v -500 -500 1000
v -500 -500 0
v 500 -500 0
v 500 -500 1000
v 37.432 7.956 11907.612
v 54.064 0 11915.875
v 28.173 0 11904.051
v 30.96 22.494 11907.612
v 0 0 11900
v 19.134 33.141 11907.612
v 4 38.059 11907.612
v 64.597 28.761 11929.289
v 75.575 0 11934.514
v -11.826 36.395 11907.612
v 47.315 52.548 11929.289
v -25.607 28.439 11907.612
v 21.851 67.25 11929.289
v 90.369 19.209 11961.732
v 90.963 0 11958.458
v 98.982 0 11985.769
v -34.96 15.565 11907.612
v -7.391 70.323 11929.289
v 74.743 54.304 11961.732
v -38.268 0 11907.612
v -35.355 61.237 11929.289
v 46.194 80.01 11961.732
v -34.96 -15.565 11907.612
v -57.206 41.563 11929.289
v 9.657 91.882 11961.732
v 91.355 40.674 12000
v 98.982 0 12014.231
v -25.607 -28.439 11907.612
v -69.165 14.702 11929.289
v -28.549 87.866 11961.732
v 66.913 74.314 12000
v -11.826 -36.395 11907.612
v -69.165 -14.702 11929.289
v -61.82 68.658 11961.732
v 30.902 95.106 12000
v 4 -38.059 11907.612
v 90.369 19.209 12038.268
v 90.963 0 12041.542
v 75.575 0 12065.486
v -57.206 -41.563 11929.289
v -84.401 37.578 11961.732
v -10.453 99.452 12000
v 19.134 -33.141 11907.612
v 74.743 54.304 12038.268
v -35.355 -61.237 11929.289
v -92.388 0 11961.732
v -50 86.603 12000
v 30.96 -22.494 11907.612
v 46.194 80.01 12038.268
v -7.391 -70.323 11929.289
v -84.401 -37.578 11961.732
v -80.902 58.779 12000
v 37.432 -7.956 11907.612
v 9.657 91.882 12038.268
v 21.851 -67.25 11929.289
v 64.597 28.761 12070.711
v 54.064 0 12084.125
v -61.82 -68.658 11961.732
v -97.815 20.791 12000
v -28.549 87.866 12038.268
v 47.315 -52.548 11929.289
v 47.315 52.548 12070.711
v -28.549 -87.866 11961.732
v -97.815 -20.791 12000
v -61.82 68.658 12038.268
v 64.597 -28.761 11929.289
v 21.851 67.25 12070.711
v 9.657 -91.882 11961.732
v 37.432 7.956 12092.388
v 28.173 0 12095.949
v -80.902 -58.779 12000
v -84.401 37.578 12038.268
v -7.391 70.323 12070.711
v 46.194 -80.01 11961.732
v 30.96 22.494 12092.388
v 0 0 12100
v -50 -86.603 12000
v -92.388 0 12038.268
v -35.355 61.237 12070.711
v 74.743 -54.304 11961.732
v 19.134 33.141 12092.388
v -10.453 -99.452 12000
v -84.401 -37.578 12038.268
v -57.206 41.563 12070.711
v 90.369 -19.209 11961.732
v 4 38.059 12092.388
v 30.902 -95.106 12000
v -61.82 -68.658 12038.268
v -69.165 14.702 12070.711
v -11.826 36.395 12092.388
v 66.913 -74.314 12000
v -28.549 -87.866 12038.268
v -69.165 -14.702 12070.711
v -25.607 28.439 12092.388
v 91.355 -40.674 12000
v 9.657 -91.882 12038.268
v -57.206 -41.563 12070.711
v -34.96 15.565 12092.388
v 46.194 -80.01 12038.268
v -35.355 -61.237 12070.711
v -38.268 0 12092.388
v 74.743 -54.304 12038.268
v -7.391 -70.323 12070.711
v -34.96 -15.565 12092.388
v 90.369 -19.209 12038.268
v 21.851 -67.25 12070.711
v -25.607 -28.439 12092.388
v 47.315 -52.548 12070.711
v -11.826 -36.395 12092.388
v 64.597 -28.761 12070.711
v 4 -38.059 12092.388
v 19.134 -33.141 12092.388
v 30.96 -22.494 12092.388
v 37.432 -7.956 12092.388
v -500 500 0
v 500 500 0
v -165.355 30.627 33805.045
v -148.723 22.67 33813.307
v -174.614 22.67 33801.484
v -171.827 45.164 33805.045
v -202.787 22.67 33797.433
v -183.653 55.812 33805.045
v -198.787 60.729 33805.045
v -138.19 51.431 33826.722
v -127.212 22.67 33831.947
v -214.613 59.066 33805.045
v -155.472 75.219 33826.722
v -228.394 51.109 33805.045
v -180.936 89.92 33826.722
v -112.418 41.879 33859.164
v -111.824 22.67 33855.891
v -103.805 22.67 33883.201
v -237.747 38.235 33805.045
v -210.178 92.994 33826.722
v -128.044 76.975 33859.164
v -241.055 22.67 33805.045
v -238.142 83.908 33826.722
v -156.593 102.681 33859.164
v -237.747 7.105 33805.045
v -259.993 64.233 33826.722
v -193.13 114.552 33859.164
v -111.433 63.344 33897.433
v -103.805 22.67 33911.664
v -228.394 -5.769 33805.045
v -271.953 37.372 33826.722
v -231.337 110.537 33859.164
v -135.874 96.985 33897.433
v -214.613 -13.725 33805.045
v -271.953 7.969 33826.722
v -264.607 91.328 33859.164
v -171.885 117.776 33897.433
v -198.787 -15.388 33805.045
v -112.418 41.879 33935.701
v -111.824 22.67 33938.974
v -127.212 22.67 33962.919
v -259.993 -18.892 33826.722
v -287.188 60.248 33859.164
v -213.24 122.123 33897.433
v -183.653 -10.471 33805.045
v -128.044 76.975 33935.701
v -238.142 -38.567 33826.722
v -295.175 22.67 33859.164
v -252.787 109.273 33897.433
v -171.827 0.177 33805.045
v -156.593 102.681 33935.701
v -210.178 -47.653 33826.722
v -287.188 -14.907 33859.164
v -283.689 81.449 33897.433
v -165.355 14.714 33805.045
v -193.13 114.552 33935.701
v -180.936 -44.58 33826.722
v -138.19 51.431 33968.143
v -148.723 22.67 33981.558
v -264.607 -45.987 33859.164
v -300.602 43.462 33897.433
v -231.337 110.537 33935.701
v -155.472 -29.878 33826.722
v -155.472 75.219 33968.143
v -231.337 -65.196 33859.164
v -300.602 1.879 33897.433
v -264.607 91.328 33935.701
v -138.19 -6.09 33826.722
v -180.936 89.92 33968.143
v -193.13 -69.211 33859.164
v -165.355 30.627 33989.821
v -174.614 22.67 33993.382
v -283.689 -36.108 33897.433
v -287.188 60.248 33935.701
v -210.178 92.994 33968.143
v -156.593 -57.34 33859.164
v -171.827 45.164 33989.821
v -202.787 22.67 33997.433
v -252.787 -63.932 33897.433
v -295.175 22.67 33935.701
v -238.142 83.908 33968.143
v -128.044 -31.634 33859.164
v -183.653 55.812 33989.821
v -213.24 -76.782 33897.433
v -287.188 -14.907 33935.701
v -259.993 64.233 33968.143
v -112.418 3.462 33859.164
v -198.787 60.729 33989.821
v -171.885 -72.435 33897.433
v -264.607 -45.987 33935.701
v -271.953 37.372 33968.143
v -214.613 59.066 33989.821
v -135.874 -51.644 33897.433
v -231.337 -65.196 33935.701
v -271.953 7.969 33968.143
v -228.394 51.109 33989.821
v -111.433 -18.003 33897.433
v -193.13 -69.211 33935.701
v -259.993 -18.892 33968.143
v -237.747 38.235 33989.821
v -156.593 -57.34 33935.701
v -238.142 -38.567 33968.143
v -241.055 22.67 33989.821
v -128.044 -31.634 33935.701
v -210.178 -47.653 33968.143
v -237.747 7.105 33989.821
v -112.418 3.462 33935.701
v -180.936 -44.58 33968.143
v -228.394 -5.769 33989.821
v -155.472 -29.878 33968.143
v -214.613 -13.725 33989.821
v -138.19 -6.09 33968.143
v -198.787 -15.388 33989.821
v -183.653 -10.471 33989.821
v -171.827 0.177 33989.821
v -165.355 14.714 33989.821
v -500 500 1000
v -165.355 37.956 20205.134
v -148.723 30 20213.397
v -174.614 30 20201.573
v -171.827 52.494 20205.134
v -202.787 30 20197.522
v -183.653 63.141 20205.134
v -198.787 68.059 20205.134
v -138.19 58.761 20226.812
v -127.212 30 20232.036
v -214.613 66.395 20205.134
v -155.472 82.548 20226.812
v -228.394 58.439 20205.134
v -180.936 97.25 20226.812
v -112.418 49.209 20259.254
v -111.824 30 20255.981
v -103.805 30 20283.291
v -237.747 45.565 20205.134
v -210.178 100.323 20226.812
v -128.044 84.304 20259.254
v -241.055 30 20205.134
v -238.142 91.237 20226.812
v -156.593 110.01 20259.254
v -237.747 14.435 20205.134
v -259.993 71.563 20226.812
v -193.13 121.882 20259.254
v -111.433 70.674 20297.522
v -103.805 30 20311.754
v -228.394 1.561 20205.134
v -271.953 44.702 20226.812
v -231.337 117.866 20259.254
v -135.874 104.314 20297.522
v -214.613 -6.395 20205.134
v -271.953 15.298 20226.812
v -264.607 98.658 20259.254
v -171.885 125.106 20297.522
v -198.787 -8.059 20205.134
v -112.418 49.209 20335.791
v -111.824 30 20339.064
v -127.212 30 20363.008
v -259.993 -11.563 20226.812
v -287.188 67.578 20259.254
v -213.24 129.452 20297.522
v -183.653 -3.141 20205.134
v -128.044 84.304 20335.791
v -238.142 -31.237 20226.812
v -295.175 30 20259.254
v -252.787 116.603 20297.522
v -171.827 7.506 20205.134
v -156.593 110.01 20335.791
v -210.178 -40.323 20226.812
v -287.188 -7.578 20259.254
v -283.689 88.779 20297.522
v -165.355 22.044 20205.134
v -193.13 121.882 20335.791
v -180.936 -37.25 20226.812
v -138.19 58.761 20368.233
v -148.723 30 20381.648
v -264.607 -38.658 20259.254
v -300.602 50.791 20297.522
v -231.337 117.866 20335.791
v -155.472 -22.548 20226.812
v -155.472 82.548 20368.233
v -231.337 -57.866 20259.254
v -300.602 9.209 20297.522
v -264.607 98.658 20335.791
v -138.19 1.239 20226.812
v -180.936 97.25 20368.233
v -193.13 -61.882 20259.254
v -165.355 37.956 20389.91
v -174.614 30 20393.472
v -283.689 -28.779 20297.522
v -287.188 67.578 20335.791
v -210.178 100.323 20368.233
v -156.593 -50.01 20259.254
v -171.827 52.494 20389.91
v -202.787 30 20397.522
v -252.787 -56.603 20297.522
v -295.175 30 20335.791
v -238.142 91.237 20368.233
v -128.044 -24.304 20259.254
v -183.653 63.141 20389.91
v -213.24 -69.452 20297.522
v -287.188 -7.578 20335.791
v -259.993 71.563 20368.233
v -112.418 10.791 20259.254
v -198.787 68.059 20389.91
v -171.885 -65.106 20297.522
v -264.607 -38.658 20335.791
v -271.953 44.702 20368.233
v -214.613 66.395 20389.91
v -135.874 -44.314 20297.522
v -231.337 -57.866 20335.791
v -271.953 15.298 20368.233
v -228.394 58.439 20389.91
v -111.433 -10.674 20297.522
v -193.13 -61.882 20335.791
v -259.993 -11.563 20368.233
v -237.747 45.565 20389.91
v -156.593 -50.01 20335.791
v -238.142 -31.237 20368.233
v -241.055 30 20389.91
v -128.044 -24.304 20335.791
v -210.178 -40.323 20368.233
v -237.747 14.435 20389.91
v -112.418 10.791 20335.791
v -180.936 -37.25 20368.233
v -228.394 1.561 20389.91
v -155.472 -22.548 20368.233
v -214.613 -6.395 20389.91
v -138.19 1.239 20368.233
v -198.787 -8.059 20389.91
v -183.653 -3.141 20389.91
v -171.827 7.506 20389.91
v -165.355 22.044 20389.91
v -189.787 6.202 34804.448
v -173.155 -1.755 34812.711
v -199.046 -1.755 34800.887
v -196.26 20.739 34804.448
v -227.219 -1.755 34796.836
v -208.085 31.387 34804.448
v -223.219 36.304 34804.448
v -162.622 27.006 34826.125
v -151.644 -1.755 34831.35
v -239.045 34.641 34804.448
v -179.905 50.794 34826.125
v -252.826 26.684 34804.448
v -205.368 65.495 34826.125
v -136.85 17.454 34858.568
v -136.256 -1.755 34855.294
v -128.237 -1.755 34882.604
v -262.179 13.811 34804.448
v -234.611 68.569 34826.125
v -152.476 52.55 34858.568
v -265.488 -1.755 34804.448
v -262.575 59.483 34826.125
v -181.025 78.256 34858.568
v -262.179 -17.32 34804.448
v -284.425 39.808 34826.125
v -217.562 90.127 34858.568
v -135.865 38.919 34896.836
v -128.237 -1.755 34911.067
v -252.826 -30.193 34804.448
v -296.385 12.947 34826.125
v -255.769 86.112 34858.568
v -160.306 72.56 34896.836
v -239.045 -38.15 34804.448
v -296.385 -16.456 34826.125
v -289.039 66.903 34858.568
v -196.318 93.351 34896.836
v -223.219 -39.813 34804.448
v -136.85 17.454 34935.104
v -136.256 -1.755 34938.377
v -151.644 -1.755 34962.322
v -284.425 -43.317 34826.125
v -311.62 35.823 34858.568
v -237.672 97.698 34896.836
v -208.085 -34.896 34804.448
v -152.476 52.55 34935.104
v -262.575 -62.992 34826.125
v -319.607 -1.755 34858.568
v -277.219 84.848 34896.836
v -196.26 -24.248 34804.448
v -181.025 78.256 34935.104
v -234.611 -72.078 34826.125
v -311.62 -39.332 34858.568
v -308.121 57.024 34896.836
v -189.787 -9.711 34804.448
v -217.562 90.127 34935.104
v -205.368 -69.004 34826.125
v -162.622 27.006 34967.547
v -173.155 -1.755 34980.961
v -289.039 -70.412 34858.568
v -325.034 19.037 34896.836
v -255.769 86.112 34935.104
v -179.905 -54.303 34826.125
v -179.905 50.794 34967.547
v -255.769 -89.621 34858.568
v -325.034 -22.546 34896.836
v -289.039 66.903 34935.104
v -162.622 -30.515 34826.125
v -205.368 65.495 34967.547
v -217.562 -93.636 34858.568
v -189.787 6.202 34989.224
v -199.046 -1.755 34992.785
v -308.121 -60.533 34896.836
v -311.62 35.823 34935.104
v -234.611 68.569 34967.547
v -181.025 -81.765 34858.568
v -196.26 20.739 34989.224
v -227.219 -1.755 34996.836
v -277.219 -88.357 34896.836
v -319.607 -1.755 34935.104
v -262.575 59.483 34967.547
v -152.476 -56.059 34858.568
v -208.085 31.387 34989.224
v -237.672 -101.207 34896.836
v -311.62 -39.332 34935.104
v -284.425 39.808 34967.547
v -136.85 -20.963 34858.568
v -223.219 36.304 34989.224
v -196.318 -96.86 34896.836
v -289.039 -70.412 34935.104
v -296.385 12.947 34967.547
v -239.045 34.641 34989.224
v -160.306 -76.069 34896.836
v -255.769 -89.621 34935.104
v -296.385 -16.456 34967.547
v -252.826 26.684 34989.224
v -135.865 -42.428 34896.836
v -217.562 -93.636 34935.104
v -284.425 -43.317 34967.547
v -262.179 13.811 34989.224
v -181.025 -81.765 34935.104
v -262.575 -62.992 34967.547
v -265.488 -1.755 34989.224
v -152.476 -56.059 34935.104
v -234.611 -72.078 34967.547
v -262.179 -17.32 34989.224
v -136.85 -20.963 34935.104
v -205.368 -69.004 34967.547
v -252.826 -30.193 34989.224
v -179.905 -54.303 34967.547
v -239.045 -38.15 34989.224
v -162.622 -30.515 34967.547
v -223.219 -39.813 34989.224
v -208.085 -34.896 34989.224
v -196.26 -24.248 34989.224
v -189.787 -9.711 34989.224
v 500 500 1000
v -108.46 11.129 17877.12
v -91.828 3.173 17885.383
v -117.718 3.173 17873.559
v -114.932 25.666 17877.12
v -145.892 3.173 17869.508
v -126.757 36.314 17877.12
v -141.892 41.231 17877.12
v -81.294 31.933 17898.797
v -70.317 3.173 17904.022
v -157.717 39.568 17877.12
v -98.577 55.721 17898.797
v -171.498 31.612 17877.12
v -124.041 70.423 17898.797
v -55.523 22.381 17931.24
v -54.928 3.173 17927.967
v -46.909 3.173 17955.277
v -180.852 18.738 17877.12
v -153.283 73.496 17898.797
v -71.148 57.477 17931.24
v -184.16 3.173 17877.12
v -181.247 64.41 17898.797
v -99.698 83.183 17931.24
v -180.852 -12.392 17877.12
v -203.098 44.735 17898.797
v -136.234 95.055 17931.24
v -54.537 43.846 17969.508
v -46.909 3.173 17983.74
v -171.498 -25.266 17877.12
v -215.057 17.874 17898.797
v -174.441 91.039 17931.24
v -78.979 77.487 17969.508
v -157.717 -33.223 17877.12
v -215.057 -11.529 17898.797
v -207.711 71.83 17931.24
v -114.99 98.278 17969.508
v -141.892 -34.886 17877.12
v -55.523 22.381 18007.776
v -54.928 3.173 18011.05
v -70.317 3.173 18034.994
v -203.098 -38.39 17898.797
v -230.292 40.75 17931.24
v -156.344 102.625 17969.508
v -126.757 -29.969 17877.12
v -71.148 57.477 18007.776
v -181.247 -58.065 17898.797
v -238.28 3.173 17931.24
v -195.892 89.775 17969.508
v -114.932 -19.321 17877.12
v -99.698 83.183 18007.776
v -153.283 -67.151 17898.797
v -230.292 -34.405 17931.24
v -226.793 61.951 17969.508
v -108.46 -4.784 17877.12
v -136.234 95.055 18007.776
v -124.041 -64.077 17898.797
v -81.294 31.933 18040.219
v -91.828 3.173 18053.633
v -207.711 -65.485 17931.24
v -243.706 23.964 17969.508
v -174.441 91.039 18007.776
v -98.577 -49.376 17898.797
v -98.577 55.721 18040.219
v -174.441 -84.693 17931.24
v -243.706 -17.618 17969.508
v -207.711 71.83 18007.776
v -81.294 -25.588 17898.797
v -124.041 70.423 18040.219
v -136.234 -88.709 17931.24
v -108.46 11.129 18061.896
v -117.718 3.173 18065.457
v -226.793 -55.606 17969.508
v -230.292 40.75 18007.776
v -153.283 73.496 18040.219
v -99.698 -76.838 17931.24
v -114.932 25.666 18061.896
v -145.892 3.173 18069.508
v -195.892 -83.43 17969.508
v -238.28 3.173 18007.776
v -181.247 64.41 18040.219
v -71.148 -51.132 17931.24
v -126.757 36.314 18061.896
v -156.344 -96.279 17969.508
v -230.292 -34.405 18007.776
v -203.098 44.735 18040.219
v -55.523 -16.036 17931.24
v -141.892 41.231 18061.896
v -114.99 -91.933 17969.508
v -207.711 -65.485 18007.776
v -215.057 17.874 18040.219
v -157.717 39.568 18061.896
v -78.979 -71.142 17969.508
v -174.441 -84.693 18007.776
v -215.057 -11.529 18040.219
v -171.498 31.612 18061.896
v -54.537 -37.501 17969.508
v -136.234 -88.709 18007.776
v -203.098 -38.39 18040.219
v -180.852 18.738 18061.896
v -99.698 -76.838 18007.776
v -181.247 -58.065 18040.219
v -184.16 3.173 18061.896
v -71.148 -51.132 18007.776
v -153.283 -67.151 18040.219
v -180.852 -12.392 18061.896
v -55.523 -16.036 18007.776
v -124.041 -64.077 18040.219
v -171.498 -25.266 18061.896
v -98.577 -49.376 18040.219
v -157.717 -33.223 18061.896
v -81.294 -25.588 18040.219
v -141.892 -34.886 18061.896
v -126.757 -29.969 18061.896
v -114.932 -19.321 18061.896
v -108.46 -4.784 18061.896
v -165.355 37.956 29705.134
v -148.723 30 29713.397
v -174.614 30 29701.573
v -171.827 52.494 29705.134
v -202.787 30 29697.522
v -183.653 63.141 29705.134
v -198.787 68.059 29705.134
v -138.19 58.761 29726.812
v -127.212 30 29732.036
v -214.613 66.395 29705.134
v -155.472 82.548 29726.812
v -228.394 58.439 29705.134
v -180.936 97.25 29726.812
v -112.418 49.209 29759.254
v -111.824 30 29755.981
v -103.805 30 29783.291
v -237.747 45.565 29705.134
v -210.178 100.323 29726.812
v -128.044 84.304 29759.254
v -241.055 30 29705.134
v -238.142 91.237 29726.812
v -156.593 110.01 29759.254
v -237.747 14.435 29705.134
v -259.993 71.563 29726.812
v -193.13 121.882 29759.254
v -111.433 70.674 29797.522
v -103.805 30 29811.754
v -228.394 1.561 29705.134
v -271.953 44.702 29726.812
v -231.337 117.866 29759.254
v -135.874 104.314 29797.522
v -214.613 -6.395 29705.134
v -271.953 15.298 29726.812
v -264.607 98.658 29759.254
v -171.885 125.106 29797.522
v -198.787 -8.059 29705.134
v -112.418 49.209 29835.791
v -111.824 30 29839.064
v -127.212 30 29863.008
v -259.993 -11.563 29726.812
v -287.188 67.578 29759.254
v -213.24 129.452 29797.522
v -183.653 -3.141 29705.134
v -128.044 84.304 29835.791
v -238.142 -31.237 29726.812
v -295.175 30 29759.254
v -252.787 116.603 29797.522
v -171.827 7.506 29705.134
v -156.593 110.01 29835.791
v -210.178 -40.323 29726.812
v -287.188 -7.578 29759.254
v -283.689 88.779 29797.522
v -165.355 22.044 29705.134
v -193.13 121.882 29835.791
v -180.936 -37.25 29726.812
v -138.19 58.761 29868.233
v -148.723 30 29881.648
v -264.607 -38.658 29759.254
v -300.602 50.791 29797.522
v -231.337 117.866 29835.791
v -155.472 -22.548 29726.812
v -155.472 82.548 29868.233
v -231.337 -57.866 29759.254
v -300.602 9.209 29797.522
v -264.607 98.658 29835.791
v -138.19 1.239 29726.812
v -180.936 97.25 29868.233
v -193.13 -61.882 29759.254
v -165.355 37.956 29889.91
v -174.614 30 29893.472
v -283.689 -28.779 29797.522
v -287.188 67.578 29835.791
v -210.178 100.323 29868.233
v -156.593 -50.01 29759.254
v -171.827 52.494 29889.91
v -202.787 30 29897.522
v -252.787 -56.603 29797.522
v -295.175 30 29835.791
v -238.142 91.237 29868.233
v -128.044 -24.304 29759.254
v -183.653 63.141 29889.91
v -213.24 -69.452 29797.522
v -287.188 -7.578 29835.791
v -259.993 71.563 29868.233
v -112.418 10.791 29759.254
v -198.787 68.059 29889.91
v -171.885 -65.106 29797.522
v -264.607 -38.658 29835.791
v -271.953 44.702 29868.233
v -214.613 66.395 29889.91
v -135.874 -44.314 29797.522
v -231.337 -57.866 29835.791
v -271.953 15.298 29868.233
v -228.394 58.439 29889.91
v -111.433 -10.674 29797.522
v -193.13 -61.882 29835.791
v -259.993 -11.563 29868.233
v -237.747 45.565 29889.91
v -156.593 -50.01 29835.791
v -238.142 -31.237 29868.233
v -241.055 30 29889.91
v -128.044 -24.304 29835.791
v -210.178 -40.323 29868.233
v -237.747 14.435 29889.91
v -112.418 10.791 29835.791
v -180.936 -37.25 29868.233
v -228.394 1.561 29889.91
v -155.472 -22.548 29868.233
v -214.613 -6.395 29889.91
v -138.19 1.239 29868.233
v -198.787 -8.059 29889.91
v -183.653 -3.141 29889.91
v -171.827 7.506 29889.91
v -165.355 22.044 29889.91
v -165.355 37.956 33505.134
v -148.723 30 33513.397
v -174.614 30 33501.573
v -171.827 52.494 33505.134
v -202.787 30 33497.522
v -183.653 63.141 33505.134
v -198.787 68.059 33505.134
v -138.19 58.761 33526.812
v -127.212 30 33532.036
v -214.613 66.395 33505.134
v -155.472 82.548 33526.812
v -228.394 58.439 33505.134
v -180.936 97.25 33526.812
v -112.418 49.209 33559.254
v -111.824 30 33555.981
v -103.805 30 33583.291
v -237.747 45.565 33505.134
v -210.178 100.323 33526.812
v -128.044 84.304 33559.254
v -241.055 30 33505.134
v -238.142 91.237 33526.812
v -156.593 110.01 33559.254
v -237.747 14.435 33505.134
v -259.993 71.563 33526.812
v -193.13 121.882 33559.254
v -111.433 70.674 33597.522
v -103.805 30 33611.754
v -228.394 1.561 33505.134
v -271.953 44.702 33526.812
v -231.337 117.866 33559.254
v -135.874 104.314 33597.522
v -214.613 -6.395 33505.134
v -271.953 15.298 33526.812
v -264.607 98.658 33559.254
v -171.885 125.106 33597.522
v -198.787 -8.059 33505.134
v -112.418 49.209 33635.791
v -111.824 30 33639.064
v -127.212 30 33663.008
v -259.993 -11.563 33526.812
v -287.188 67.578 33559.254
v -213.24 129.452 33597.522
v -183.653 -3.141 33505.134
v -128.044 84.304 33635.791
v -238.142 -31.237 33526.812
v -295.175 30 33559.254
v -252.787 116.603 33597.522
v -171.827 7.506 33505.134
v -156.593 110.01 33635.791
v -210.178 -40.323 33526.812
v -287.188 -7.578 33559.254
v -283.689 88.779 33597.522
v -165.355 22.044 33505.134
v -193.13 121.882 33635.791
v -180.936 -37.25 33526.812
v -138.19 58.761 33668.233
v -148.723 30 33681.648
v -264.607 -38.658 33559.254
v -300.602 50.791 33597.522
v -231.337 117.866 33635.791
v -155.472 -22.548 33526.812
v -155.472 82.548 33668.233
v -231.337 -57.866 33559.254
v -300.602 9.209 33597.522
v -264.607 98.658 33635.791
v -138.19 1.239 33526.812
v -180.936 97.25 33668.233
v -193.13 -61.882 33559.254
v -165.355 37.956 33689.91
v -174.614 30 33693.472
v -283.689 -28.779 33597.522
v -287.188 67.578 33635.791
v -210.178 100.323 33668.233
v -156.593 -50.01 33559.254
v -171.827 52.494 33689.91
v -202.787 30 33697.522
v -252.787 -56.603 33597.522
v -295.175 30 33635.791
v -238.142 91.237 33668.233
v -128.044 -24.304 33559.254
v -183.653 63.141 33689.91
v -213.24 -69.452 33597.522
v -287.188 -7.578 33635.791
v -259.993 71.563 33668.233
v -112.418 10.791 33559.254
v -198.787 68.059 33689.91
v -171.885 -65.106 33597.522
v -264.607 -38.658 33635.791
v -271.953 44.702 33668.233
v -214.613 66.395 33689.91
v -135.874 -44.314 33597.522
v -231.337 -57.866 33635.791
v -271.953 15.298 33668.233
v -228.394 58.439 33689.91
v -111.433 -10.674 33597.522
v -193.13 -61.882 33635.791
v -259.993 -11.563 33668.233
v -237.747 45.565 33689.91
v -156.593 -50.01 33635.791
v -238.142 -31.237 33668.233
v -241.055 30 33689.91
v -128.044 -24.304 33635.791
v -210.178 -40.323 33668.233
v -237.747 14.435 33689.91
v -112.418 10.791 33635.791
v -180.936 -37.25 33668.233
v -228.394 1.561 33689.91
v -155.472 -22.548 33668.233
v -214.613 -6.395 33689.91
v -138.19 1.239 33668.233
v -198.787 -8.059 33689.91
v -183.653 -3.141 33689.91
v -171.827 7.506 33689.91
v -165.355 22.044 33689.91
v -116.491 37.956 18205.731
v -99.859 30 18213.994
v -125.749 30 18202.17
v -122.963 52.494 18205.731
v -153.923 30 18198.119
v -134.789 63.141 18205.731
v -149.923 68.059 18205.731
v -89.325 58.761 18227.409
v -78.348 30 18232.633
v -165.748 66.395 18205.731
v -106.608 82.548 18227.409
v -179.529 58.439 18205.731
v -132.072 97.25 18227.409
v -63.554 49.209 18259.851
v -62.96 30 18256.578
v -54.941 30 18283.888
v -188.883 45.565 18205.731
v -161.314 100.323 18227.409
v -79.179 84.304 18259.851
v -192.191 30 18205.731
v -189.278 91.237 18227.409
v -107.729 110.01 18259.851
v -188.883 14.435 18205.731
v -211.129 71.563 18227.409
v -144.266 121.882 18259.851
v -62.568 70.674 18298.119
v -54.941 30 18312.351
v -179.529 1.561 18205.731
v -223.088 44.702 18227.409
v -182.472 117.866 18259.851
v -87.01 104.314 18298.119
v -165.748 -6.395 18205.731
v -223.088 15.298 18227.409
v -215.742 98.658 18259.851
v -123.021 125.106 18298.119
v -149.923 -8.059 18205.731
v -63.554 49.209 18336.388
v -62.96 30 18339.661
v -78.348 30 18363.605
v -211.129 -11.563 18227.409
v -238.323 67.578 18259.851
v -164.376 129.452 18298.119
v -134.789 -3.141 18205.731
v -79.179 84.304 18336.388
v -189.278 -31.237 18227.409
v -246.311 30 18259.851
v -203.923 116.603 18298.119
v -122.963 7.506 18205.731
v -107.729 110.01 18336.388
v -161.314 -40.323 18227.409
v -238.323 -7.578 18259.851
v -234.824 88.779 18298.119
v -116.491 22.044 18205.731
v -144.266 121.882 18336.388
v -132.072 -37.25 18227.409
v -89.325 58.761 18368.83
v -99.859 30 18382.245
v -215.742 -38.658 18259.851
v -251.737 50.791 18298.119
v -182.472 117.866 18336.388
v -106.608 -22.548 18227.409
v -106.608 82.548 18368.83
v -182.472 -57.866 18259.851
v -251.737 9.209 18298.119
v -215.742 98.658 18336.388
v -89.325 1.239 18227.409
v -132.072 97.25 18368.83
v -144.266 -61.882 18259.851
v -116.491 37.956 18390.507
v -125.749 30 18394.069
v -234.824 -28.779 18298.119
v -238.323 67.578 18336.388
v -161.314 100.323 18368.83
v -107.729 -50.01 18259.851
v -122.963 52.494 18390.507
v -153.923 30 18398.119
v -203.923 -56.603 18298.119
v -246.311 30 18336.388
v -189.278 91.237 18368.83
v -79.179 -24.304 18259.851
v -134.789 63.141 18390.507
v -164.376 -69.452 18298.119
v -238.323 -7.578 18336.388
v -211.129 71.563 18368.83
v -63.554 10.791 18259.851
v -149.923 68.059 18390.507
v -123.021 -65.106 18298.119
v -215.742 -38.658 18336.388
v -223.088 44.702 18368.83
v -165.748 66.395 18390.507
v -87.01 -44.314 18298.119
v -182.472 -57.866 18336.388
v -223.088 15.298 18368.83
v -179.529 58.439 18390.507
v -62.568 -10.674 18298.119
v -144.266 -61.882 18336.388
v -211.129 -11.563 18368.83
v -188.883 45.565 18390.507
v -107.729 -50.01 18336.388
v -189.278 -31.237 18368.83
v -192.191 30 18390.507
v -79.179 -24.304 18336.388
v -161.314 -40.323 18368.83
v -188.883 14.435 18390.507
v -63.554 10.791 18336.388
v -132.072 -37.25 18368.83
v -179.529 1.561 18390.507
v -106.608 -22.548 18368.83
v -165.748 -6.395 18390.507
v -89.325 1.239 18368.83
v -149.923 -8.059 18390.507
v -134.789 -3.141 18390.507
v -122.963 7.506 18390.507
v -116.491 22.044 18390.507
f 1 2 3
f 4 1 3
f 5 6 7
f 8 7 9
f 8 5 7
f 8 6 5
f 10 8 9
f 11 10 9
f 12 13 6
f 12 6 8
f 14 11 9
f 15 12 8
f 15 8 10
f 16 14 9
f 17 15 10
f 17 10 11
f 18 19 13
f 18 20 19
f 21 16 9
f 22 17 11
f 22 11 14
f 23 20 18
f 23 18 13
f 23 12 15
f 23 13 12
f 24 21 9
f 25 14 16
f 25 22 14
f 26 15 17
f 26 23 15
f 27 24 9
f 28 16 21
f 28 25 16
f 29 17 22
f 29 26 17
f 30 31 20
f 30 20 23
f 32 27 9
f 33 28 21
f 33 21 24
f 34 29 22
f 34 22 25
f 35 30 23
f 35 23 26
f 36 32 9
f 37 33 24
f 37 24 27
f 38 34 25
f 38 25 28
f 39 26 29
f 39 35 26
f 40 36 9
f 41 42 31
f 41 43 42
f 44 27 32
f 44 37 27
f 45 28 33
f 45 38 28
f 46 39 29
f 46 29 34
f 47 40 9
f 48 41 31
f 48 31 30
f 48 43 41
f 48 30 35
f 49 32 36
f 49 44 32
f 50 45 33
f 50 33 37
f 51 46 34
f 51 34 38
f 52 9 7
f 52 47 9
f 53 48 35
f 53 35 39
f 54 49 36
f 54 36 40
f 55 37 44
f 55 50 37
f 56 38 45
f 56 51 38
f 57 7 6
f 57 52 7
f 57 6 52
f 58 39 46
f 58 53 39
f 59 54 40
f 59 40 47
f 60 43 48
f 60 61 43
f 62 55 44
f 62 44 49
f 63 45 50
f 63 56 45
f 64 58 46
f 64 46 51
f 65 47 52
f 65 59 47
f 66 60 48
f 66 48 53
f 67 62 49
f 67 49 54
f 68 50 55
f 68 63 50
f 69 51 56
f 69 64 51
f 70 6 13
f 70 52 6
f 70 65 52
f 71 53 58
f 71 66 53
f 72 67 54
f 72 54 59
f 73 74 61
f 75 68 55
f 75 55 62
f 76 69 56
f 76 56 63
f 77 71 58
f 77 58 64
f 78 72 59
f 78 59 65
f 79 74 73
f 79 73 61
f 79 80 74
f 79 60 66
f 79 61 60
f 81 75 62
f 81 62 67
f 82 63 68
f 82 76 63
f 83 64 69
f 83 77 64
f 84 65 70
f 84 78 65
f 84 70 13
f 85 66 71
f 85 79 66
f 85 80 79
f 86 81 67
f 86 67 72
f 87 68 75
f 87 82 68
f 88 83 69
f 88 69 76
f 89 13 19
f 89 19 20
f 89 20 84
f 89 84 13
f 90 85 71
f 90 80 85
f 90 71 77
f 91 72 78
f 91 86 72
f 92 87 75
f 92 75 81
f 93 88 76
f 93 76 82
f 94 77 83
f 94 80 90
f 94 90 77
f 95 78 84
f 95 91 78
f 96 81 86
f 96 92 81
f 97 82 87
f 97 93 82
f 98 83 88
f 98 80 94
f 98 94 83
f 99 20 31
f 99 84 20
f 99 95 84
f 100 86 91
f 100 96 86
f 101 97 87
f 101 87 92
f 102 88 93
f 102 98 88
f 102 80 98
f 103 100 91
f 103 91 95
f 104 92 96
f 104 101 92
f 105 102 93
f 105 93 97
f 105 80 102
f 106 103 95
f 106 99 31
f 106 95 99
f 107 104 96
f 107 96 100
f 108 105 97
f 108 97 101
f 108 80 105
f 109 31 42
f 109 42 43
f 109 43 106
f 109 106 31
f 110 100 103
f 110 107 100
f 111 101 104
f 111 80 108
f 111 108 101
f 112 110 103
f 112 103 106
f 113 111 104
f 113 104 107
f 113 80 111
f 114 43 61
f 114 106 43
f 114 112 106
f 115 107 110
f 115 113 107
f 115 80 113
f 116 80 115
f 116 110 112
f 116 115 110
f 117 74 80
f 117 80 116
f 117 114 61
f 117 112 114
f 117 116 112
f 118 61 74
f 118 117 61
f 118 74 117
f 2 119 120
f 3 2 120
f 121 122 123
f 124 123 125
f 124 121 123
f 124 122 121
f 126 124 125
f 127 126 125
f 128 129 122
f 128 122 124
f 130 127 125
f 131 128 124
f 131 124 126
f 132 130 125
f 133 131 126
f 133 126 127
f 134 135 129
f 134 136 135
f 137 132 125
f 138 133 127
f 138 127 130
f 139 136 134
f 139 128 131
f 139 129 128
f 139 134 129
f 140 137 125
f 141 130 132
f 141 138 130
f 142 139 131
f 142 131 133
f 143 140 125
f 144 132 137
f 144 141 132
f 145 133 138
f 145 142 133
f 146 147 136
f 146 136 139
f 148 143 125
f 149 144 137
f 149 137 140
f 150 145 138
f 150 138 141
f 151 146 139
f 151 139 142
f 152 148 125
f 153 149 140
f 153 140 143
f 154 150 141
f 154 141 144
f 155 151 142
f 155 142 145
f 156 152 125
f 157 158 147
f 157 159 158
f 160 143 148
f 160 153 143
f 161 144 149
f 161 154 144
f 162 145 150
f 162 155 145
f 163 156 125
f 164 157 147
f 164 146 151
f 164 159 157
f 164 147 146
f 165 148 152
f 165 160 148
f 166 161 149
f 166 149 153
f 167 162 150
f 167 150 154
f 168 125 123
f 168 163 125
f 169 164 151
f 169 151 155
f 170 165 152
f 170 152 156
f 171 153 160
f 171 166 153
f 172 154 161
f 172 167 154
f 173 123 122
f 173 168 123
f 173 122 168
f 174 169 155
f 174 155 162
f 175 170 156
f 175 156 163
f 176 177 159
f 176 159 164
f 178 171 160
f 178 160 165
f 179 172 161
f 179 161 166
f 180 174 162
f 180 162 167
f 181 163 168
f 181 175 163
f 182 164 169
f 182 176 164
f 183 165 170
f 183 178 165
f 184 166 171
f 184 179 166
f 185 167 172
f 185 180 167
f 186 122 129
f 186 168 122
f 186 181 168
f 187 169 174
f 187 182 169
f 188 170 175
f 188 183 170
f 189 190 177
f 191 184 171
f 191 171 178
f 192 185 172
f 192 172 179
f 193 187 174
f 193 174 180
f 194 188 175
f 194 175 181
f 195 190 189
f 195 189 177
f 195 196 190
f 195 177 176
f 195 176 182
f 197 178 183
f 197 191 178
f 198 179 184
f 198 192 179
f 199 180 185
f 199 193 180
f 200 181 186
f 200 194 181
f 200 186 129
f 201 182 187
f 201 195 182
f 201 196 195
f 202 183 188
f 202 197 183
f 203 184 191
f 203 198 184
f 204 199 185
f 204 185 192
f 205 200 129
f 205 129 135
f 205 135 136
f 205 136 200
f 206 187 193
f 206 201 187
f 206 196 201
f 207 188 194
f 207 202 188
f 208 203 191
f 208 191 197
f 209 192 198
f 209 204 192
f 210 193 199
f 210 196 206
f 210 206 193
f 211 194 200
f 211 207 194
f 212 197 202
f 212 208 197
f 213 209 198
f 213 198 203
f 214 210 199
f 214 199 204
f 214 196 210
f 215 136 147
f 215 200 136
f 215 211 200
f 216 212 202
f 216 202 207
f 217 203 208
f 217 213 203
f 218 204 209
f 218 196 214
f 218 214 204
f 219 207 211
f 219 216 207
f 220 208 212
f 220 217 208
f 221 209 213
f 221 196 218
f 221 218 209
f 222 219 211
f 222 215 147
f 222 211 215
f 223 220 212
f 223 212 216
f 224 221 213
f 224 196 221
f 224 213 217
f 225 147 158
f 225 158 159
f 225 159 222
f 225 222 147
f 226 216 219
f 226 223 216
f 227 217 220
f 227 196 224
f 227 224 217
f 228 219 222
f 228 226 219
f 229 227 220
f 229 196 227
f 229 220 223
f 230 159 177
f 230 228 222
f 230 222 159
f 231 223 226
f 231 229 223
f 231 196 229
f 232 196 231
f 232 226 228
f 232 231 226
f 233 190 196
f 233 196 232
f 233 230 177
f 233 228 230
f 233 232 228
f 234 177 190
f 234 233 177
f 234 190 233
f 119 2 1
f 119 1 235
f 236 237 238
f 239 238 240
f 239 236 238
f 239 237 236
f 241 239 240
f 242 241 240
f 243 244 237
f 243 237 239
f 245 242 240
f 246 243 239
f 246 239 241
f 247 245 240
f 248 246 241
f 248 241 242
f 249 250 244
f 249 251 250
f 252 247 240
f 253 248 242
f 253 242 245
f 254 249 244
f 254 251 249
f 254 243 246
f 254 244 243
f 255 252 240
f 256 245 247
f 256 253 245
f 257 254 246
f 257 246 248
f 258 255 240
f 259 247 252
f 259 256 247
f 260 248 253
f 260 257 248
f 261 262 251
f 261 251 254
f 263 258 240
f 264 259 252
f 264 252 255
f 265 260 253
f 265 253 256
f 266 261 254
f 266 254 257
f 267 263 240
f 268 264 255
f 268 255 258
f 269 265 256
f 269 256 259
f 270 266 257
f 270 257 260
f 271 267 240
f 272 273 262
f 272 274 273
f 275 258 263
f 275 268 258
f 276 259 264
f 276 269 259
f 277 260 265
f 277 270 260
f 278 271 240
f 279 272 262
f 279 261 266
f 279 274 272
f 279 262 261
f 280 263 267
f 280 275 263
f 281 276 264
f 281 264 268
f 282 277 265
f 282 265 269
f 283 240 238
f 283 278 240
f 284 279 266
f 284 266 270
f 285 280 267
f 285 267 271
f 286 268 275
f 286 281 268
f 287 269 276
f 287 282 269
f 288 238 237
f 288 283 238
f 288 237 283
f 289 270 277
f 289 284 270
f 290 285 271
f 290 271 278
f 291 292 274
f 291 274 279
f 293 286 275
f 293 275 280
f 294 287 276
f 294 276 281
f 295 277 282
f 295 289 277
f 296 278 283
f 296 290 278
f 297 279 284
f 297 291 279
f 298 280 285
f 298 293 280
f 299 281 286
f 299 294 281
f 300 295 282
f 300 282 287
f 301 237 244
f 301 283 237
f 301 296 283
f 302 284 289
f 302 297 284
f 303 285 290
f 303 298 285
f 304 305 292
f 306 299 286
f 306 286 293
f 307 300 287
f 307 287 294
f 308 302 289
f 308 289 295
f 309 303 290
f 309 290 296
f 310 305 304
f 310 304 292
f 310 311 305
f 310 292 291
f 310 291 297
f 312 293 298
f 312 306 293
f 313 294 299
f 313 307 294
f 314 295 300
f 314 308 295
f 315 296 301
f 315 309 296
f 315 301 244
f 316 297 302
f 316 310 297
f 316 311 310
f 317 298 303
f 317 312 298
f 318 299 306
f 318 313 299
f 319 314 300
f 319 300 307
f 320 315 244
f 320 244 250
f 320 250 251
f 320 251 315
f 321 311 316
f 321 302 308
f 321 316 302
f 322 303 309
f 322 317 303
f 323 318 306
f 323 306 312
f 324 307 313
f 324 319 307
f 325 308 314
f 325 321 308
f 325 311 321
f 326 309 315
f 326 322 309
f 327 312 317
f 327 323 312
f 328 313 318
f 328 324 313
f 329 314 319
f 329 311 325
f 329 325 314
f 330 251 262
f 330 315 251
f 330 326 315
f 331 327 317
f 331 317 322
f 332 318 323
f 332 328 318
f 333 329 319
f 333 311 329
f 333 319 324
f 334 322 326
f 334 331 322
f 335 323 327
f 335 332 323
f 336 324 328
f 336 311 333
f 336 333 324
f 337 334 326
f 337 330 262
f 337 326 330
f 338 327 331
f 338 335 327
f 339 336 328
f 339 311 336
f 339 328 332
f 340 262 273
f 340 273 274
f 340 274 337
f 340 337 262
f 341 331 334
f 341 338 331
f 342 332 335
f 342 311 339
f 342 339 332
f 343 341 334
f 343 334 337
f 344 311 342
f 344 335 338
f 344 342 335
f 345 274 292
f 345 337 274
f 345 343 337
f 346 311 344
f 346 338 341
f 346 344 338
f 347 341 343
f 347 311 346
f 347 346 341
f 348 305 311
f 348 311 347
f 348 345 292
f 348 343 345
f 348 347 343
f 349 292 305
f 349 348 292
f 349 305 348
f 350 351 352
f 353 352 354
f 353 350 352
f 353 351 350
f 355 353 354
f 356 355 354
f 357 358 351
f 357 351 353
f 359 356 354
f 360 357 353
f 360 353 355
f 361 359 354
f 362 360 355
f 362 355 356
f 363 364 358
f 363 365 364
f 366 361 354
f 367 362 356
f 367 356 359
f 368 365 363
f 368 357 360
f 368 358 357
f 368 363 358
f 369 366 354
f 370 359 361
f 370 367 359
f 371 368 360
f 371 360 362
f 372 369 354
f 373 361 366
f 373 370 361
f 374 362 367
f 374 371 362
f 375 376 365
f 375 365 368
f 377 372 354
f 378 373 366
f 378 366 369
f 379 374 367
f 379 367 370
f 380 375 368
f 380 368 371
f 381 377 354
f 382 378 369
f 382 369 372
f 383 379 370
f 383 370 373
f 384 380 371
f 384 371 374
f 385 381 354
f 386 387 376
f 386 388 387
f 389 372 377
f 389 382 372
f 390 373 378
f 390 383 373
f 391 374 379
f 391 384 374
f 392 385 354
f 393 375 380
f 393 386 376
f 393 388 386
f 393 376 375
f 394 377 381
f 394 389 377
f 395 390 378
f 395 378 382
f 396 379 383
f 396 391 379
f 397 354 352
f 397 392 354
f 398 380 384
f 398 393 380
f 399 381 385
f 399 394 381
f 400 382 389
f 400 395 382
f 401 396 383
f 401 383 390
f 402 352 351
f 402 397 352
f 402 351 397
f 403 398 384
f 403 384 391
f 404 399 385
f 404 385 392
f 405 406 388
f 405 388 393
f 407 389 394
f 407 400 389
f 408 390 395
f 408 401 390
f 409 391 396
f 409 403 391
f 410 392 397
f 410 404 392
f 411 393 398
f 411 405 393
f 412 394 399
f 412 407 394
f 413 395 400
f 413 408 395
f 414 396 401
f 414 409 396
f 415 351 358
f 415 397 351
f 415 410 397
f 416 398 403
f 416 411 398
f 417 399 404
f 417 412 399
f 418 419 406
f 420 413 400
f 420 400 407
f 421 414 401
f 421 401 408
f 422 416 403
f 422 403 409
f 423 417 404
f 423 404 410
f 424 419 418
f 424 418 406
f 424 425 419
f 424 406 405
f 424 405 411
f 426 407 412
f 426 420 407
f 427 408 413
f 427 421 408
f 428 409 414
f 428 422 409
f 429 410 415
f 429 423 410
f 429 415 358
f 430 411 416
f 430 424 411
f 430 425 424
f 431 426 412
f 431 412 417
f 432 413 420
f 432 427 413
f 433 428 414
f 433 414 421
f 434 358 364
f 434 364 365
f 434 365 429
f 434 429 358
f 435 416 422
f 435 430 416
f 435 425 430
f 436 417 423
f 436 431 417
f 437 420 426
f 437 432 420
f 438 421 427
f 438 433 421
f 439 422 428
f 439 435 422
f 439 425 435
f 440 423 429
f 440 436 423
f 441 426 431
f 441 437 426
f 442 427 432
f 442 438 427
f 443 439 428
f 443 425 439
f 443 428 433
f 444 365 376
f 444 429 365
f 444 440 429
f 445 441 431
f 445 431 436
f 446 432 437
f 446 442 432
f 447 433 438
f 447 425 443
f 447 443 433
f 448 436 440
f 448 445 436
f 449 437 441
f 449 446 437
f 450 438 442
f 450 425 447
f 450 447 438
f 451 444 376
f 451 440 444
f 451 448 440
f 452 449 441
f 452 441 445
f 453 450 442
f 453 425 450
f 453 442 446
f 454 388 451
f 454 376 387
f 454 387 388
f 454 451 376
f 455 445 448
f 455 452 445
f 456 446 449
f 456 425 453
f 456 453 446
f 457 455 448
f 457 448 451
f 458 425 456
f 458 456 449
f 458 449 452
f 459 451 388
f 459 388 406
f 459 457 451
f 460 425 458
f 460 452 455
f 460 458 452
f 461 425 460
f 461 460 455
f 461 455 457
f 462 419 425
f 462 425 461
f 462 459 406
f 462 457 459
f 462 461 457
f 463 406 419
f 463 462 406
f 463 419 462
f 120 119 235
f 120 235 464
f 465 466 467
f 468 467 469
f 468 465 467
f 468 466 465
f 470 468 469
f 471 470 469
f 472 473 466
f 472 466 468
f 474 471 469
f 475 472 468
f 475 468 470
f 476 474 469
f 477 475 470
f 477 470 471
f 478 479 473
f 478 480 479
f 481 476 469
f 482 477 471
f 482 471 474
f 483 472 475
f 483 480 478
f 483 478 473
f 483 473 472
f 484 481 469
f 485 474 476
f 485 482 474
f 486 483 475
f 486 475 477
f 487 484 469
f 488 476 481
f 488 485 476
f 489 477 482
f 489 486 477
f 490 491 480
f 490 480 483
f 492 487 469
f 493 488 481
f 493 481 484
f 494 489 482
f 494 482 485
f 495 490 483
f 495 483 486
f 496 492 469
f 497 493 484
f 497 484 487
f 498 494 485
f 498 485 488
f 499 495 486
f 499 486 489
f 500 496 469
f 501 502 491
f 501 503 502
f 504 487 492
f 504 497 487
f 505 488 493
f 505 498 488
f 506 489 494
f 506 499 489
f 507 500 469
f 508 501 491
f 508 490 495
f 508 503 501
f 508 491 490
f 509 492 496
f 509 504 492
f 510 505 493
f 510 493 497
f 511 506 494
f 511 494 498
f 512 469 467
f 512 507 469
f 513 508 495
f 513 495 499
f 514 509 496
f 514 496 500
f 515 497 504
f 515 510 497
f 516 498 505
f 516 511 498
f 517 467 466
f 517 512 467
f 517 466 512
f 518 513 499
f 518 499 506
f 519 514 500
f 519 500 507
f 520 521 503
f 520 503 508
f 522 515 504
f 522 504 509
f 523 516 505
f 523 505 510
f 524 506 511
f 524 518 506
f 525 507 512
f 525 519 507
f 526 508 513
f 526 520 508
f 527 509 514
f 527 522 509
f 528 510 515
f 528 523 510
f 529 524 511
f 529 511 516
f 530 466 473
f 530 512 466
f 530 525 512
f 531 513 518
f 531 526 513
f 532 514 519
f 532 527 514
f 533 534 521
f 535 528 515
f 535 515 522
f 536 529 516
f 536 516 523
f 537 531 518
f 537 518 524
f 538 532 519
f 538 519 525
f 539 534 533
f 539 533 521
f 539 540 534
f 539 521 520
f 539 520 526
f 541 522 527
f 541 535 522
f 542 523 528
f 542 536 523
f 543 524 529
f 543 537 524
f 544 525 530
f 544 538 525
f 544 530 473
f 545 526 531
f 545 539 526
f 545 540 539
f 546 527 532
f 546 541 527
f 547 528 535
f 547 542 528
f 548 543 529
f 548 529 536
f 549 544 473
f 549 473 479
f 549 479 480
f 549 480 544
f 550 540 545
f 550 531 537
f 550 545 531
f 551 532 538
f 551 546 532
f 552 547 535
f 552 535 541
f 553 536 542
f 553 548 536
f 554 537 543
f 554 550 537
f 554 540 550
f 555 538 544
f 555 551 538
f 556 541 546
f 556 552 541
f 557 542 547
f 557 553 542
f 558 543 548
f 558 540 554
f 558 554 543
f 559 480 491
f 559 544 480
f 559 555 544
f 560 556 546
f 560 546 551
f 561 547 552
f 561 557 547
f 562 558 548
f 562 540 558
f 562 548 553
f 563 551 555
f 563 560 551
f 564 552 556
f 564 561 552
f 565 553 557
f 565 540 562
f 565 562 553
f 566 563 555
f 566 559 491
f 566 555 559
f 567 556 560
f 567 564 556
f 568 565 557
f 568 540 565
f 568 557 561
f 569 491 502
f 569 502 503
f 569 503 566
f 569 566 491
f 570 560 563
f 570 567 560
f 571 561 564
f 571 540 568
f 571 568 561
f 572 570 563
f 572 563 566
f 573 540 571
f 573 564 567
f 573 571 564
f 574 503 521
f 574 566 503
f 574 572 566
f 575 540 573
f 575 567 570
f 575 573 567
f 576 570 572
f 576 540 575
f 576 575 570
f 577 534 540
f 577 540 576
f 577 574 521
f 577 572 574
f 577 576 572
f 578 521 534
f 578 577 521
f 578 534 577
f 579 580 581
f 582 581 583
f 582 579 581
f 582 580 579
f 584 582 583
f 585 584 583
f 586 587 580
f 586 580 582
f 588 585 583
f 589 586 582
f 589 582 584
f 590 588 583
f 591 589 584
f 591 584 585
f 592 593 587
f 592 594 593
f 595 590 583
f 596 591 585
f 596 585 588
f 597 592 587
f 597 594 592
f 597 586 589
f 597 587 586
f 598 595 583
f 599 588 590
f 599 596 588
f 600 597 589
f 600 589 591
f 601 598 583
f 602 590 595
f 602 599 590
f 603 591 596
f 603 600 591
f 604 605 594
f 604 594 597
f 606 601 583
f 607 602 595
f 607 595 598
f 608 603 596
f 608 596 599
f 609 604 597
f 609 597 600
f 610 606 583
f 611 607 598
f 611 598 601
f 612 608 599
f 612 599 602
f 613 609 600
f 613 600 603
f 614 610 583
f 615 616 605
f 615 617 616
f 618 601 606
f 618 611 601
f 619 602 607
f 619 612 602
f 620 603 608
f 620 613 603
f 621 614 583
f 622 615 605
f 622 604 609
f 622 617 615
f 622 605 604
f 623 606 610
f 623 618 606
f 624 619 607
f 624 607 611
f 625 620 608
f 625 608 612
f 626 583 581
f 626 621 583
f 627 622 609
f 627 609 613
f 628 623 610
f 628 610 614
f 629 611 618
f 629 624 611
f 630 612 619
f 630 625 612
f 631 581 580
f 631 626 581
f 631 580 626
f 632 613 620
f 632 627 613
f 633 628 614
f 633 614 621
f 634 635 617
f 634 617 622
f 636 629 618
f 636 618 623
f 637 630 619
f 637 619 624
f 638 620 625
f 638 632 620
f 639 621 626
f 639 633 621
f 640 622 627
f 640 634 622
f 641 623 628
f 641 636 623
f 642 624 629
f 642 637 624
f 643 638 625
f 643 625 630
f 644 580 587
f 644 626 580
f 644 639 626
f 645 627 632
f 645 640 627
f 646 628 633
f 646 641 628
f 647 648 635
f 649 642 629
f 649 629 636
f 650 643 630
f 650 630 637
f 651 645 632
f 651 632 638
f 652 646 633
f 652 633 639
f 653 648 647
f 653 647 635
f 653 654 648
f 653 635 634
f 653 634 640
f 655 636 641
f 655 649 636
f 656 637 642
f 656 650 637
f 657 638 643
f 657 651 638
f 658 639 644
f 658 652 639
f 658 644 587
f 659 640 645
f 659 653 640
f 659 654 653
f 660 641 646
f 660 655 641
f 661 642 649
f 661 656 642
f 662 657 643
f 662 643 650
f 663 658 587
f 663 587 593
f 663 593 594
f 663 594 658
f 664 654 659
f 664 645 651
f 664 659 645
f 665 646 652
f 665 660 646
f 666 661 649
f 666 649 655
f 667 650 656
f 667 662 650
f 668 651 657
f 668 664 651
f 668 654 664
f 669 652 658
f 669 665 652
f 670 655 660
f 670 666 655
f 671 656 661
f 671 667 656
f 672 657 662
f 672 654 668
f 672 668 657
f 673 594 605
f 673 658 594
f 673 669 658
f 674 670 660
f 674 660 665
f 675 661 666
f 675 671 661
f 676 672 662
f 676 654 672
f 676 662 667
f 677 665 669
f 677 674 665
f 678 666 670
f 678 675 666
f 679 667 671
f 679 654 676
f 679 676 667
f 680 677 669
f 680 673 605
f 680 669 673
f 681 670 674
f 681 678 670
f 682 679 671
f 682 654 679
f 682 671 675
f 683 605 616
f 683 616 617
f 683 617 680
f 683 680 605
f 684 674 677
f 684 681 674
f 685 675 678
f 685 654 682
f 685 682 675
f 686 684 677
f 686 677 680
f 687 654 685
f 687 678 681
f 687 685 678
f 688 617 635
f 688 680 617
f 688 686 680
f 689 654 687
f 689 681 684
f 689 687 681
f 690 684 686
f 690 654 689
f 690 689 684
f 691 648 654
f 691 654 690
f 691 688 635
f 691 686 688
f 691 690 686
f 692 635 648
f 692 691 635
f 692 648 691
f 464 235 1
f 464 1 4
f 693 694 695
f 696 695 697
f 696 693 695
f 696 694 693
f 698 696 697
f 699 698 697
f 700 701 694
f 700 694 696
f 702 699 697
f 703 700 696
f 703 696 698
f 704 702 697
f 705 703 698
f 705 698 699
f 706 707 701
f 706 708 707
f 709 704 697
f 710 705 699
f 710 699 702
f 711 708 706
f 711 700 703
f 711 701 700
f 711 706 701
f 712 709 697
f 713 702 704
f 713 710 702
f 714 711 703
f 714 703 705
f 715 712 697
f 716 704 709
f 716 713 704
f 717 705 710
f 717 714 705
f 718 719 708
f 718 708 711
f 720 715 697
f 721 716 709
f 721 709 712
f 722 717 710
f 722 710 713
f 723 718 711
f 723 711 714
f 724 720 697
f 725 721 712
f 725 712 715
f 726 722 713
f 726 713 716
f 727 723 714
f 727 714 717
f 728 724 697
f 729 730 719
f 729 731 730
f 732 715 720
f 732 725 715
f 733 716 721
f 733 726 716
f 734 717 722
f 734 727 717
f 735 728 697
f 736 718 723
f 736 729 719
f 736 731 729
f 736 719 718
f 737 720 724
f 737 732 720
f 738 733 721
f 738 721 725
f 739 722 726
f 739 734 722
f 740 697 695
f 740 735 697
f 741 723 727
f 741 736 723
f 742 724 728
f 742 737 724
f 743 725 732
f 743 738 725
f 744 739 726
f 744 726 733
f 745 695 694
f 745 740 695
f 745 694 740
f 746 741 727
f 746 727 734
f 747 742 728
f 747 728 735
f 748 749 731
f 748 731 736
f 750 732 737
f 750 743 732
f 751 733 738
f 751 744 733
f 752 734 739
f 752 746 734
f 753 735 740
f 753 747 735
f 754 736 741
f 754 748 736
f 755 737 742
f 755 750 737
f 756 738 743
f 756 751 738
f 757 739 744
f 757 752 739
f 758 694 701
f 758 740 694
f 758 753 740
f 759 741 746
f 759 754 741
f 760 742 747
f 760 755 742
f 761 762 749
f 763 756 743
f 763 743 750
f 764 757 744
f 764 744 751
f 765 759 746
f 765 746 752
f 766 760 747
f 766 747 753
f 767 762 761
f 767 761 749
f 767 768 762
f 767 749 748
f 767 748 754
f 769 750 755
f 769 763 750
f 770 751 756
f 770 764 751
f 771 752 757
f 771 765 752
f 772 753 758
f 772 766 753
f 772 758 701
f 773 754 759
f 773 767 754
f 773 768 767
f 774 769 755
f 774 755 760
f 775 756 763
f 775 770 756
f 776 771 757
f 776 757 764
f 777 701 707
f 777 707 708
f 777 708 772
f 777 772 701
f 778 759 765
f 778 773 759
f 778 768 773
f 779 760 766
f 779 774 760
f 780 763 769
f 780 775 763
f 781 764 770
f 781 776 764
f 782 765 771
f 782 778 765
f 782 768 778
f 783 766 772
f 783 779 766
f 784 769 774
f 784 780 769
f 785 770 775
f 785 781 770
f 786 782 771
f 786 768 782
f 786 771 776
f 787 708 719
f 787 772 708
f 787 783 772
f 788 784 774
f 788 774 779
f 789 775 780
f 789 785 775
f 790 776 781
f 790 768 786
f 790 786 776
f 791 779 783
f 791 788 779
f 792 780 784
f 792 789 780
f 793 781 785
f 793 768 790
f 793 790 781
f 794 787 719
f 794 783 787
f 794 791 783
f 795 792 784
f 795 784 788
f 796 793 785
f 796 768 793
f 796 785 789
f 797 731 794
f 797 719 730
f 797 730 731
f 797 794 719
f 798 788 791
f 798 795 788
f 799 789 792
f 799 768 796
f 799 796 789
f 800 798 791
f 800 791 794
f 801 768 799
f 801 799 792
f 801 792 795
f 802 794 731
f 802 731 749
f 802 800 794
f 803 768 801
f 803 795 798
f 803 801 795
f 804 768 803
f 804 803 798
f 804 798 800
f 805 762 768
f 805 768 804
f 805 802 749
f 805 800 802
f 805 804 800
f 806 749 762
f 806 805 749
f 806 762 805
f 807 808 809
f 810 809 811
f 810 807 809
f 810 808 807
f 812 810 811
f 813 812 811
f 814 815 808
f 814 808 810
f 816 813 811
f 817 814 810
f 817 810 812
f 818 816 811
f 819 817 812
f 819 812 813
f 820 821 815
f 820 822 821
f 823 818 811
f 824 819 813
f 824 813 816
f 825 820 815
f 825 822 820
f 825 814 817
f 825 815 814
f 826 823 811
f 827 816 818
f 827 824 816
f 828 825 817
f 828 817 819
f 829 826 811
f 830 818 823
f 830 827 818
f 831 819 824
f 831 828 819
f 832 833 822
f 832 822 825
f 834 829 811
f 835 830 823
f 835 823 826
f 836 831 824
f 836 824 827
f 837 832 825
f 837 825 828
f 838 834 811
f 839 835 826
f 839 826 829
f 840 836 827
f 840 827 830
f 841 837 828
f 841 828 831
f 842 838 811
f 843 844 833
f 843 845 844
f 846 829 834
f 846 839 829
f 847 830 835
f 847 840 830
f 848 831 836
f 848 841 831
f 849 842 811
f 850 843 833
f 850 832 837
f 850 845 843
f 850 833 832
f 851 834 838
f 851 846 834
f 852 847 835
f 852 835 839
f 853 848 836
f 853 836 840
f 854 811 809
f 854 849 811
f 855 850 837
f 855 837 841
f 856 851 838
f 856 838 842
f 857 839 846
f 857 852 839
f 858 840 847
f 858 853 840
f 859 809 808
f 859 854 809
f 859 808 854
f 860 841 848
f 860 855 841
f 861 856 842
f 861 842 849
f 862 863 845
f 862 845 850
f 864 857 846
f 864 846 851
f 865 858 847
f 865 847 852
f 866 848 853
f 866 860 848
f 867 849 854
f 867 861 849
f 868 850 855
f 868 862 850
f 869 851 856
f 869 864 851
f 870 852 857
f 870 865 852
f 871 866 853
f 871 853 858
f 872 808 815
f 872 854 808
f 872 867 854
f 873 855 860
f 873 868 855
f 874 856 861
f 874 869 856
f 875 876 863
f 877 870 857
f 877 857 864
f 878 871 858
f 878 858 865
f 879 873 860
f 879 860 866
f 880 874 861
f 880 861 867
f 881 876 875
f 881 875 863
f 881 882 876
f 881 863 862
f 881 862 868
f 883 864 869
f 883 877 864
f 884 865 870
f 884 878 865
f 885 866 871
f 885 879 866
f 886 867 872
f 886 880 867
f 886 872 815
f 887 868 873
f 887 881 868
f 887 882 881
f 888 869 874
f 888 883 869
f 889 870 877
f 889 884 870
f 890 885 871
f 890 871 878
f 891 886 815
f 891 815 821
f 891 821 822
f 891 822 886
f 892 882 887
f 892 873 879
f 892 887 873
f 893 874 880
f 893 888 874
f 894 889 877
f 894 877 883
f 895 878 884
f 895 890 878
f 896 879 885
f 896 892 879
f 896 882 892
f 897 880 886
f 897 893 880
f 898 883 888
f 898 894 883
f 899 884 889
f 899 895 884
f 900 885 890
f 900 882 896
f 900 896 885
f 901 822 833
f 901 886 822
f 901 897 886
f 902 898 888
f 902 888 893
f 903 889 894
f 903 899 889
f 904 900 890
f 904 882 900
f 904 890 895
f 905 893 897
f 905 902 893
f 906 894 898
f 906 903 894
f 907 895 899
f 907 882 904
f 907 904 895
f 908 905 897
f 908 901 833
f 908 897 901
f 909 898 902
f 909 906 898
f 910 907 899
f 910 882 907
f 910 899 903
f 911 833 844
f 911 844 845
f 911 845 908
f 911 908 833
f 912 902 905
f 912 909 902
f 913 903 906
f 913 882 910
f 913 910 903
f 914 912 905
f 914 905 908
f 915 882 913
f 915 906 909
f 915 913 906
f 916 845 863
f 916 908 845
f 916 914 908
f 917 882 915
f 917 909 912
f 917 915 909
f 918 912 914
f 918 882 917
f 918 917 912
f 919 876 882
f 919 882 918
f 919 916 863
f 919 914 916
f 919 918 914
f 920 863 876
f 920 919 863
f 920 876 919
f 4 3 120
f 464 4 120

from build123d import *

# Parameters (mm, degrees)
SOURCEBOX_W     = 1000
SOURCEBOX_H     = 1000
SOURCEBOX_DEPTH = 1000


with BuildPart() as sourcebox:
    # SourceBox → SourceBox (new body)
    with BuildSketch(Plane(origin=(-500, -500, 0), x_dir=(1, 0, 0), z_dir=(0, 0, 1))):
        with Locations((500, 500)):
            Rectangle(SOURCEBOX_W, SOURCEBOX_H)
    extrude(amount=SOURCEBOX_DEPTH)


with BuildPart() as m1:
    # M1 → M1 (revolve)
    with BuildSketch(Plane(origin=(0, 0, 12000), x_dir=(1, 0, 0), z_dir=(0, -1, 0))):
        with BuildLine():
            ThreePointArc((0, -100), (100, 0), (0, 100))
            Line((0, 100), (0, -100))
        make_face()
    revolve(axis=Axis((0, 0, 12000), (0, 0, 1)))


with BuildPart() as premirrorm2:
    # PremirrorM2 → PremirrorM2 (revolve)
    with BuildSketch(Plane(origin=(-145.891634, 3.172693, 17969.508044), x_dir=(1, 0, 0), z_dir=(0, -1, 0))):
        with BuildLine():
            ThreePointArc((0, -100), (100, 0), (0, 100))
            Line((0, 100), (0, -100))
        make_face()
    revolve(axis=Axis((-145.891634, 3.172693, 17969.508044), (0, 0, 1)))


with BuildPart() as pg:
    # PG → PG (revolve)
    with BuildSketch(Plane(origin=(-153.922722, 30, 18298.119386), x_dir=(1, 0, 0), z_dir=(0, -1, 0))):
        with BuildLine():
            ThreePointArc((0, -100), (100, 0), (0, 100))
            Line((0, 100), (0, -100))
        make_face()
    revolve(axis=Axis((-153.922722, 30, 18298.119386), (0, 0, 1)))


with BuildPart() as m3:
    # M3 → M3 (revolve)
    with BuildSketch(Plane(origin=(-202.787079, 30, 20297.522365), x_dir=(1, 0, 0), z_dir=(0, -1, 0))):
        with BuildLine():
            ThreePointArc((0, -100), (100, 0), (0, 100))
            Line((0, 100), (0, -100))
        make_face()
    revolve(axis=Axis((-202.787079, 30, 20297.522365), (0, 0, 1)))


with BuildPart() as exitslit:
    # ExitSlit → ExitSlit (revolve)
    with BuildSketch(Plane(origin=(-202.787079, 30, 29797.522365), x_dir=(1, 0, 0), z_dir=(0, -1, 0))):
        with BuildLine():
            ThreePointArc((0, -100), (100, 0), (0, 100))
            Line((0, 100), (0, -100))
        make_face()
    revolve(axis=Axis((-202.787079, 30, 29797.522365), (0, 0, 1)))


with BuildPart() as kb_ver:
    # KB_ver → KB_ver (revolve)
    with BuildSketch(Plane(origin=(-202.787079, 30, 33597.522365), x_dir=(1, 0, 0), z_dir=(0, -1, 0))):
        with BuildLine():
            ThreePointArc((0, -100), (100, 0), (0, 100))
            Line((0, 100), (0, -100))
        make_face()
    revolve(axis=Axis((-202.787079, 30, 33597.522365), (0, 0, 1)))


with BuildPart() as kb_hor:
    # KB_hor → KB_hor (revolve)
    with BuildSketch(Plane(origin=(-202.787079, 22.670346, 33897.432812), x_dir=(1, 0, 0), z_dir=(0, -1, 0))):
        with BuildLine():
            ThreePointArc((0, -100), (100, 0), (0, 100))
            Line((0, 100), (0, -100))
        make_face()
    revolve(axis=Axis((-202.787079, 22.670346, 33897.432812), (0, 0, 1)))


with BuildPart() as detectoratfocus:
    # DetectorAtFocus → DetectorAtFocus (revolve)
    with BuildSketch(Plane(origin=(-227.219257, -1.754539, 34896.835881), x_dir=(1, 0, 0), z_dir=(0, -1, 0))):
        with BuildLine():
            ThreePointArc((0, -100), (100, 0), (0, 100))
            Line((0, 100), (0, -100))
        make_face()
    revolve(axis=Axis((-227.219257, -1.754539, 34896.835881), (0, 0, 1)))


solid = Compound([sourcebox.part, m1.part, premirrorm2.part, pg.part, m3.part, exitslit.part, kb_ver.part, kb_hor.part, detectoratfocus.part])
